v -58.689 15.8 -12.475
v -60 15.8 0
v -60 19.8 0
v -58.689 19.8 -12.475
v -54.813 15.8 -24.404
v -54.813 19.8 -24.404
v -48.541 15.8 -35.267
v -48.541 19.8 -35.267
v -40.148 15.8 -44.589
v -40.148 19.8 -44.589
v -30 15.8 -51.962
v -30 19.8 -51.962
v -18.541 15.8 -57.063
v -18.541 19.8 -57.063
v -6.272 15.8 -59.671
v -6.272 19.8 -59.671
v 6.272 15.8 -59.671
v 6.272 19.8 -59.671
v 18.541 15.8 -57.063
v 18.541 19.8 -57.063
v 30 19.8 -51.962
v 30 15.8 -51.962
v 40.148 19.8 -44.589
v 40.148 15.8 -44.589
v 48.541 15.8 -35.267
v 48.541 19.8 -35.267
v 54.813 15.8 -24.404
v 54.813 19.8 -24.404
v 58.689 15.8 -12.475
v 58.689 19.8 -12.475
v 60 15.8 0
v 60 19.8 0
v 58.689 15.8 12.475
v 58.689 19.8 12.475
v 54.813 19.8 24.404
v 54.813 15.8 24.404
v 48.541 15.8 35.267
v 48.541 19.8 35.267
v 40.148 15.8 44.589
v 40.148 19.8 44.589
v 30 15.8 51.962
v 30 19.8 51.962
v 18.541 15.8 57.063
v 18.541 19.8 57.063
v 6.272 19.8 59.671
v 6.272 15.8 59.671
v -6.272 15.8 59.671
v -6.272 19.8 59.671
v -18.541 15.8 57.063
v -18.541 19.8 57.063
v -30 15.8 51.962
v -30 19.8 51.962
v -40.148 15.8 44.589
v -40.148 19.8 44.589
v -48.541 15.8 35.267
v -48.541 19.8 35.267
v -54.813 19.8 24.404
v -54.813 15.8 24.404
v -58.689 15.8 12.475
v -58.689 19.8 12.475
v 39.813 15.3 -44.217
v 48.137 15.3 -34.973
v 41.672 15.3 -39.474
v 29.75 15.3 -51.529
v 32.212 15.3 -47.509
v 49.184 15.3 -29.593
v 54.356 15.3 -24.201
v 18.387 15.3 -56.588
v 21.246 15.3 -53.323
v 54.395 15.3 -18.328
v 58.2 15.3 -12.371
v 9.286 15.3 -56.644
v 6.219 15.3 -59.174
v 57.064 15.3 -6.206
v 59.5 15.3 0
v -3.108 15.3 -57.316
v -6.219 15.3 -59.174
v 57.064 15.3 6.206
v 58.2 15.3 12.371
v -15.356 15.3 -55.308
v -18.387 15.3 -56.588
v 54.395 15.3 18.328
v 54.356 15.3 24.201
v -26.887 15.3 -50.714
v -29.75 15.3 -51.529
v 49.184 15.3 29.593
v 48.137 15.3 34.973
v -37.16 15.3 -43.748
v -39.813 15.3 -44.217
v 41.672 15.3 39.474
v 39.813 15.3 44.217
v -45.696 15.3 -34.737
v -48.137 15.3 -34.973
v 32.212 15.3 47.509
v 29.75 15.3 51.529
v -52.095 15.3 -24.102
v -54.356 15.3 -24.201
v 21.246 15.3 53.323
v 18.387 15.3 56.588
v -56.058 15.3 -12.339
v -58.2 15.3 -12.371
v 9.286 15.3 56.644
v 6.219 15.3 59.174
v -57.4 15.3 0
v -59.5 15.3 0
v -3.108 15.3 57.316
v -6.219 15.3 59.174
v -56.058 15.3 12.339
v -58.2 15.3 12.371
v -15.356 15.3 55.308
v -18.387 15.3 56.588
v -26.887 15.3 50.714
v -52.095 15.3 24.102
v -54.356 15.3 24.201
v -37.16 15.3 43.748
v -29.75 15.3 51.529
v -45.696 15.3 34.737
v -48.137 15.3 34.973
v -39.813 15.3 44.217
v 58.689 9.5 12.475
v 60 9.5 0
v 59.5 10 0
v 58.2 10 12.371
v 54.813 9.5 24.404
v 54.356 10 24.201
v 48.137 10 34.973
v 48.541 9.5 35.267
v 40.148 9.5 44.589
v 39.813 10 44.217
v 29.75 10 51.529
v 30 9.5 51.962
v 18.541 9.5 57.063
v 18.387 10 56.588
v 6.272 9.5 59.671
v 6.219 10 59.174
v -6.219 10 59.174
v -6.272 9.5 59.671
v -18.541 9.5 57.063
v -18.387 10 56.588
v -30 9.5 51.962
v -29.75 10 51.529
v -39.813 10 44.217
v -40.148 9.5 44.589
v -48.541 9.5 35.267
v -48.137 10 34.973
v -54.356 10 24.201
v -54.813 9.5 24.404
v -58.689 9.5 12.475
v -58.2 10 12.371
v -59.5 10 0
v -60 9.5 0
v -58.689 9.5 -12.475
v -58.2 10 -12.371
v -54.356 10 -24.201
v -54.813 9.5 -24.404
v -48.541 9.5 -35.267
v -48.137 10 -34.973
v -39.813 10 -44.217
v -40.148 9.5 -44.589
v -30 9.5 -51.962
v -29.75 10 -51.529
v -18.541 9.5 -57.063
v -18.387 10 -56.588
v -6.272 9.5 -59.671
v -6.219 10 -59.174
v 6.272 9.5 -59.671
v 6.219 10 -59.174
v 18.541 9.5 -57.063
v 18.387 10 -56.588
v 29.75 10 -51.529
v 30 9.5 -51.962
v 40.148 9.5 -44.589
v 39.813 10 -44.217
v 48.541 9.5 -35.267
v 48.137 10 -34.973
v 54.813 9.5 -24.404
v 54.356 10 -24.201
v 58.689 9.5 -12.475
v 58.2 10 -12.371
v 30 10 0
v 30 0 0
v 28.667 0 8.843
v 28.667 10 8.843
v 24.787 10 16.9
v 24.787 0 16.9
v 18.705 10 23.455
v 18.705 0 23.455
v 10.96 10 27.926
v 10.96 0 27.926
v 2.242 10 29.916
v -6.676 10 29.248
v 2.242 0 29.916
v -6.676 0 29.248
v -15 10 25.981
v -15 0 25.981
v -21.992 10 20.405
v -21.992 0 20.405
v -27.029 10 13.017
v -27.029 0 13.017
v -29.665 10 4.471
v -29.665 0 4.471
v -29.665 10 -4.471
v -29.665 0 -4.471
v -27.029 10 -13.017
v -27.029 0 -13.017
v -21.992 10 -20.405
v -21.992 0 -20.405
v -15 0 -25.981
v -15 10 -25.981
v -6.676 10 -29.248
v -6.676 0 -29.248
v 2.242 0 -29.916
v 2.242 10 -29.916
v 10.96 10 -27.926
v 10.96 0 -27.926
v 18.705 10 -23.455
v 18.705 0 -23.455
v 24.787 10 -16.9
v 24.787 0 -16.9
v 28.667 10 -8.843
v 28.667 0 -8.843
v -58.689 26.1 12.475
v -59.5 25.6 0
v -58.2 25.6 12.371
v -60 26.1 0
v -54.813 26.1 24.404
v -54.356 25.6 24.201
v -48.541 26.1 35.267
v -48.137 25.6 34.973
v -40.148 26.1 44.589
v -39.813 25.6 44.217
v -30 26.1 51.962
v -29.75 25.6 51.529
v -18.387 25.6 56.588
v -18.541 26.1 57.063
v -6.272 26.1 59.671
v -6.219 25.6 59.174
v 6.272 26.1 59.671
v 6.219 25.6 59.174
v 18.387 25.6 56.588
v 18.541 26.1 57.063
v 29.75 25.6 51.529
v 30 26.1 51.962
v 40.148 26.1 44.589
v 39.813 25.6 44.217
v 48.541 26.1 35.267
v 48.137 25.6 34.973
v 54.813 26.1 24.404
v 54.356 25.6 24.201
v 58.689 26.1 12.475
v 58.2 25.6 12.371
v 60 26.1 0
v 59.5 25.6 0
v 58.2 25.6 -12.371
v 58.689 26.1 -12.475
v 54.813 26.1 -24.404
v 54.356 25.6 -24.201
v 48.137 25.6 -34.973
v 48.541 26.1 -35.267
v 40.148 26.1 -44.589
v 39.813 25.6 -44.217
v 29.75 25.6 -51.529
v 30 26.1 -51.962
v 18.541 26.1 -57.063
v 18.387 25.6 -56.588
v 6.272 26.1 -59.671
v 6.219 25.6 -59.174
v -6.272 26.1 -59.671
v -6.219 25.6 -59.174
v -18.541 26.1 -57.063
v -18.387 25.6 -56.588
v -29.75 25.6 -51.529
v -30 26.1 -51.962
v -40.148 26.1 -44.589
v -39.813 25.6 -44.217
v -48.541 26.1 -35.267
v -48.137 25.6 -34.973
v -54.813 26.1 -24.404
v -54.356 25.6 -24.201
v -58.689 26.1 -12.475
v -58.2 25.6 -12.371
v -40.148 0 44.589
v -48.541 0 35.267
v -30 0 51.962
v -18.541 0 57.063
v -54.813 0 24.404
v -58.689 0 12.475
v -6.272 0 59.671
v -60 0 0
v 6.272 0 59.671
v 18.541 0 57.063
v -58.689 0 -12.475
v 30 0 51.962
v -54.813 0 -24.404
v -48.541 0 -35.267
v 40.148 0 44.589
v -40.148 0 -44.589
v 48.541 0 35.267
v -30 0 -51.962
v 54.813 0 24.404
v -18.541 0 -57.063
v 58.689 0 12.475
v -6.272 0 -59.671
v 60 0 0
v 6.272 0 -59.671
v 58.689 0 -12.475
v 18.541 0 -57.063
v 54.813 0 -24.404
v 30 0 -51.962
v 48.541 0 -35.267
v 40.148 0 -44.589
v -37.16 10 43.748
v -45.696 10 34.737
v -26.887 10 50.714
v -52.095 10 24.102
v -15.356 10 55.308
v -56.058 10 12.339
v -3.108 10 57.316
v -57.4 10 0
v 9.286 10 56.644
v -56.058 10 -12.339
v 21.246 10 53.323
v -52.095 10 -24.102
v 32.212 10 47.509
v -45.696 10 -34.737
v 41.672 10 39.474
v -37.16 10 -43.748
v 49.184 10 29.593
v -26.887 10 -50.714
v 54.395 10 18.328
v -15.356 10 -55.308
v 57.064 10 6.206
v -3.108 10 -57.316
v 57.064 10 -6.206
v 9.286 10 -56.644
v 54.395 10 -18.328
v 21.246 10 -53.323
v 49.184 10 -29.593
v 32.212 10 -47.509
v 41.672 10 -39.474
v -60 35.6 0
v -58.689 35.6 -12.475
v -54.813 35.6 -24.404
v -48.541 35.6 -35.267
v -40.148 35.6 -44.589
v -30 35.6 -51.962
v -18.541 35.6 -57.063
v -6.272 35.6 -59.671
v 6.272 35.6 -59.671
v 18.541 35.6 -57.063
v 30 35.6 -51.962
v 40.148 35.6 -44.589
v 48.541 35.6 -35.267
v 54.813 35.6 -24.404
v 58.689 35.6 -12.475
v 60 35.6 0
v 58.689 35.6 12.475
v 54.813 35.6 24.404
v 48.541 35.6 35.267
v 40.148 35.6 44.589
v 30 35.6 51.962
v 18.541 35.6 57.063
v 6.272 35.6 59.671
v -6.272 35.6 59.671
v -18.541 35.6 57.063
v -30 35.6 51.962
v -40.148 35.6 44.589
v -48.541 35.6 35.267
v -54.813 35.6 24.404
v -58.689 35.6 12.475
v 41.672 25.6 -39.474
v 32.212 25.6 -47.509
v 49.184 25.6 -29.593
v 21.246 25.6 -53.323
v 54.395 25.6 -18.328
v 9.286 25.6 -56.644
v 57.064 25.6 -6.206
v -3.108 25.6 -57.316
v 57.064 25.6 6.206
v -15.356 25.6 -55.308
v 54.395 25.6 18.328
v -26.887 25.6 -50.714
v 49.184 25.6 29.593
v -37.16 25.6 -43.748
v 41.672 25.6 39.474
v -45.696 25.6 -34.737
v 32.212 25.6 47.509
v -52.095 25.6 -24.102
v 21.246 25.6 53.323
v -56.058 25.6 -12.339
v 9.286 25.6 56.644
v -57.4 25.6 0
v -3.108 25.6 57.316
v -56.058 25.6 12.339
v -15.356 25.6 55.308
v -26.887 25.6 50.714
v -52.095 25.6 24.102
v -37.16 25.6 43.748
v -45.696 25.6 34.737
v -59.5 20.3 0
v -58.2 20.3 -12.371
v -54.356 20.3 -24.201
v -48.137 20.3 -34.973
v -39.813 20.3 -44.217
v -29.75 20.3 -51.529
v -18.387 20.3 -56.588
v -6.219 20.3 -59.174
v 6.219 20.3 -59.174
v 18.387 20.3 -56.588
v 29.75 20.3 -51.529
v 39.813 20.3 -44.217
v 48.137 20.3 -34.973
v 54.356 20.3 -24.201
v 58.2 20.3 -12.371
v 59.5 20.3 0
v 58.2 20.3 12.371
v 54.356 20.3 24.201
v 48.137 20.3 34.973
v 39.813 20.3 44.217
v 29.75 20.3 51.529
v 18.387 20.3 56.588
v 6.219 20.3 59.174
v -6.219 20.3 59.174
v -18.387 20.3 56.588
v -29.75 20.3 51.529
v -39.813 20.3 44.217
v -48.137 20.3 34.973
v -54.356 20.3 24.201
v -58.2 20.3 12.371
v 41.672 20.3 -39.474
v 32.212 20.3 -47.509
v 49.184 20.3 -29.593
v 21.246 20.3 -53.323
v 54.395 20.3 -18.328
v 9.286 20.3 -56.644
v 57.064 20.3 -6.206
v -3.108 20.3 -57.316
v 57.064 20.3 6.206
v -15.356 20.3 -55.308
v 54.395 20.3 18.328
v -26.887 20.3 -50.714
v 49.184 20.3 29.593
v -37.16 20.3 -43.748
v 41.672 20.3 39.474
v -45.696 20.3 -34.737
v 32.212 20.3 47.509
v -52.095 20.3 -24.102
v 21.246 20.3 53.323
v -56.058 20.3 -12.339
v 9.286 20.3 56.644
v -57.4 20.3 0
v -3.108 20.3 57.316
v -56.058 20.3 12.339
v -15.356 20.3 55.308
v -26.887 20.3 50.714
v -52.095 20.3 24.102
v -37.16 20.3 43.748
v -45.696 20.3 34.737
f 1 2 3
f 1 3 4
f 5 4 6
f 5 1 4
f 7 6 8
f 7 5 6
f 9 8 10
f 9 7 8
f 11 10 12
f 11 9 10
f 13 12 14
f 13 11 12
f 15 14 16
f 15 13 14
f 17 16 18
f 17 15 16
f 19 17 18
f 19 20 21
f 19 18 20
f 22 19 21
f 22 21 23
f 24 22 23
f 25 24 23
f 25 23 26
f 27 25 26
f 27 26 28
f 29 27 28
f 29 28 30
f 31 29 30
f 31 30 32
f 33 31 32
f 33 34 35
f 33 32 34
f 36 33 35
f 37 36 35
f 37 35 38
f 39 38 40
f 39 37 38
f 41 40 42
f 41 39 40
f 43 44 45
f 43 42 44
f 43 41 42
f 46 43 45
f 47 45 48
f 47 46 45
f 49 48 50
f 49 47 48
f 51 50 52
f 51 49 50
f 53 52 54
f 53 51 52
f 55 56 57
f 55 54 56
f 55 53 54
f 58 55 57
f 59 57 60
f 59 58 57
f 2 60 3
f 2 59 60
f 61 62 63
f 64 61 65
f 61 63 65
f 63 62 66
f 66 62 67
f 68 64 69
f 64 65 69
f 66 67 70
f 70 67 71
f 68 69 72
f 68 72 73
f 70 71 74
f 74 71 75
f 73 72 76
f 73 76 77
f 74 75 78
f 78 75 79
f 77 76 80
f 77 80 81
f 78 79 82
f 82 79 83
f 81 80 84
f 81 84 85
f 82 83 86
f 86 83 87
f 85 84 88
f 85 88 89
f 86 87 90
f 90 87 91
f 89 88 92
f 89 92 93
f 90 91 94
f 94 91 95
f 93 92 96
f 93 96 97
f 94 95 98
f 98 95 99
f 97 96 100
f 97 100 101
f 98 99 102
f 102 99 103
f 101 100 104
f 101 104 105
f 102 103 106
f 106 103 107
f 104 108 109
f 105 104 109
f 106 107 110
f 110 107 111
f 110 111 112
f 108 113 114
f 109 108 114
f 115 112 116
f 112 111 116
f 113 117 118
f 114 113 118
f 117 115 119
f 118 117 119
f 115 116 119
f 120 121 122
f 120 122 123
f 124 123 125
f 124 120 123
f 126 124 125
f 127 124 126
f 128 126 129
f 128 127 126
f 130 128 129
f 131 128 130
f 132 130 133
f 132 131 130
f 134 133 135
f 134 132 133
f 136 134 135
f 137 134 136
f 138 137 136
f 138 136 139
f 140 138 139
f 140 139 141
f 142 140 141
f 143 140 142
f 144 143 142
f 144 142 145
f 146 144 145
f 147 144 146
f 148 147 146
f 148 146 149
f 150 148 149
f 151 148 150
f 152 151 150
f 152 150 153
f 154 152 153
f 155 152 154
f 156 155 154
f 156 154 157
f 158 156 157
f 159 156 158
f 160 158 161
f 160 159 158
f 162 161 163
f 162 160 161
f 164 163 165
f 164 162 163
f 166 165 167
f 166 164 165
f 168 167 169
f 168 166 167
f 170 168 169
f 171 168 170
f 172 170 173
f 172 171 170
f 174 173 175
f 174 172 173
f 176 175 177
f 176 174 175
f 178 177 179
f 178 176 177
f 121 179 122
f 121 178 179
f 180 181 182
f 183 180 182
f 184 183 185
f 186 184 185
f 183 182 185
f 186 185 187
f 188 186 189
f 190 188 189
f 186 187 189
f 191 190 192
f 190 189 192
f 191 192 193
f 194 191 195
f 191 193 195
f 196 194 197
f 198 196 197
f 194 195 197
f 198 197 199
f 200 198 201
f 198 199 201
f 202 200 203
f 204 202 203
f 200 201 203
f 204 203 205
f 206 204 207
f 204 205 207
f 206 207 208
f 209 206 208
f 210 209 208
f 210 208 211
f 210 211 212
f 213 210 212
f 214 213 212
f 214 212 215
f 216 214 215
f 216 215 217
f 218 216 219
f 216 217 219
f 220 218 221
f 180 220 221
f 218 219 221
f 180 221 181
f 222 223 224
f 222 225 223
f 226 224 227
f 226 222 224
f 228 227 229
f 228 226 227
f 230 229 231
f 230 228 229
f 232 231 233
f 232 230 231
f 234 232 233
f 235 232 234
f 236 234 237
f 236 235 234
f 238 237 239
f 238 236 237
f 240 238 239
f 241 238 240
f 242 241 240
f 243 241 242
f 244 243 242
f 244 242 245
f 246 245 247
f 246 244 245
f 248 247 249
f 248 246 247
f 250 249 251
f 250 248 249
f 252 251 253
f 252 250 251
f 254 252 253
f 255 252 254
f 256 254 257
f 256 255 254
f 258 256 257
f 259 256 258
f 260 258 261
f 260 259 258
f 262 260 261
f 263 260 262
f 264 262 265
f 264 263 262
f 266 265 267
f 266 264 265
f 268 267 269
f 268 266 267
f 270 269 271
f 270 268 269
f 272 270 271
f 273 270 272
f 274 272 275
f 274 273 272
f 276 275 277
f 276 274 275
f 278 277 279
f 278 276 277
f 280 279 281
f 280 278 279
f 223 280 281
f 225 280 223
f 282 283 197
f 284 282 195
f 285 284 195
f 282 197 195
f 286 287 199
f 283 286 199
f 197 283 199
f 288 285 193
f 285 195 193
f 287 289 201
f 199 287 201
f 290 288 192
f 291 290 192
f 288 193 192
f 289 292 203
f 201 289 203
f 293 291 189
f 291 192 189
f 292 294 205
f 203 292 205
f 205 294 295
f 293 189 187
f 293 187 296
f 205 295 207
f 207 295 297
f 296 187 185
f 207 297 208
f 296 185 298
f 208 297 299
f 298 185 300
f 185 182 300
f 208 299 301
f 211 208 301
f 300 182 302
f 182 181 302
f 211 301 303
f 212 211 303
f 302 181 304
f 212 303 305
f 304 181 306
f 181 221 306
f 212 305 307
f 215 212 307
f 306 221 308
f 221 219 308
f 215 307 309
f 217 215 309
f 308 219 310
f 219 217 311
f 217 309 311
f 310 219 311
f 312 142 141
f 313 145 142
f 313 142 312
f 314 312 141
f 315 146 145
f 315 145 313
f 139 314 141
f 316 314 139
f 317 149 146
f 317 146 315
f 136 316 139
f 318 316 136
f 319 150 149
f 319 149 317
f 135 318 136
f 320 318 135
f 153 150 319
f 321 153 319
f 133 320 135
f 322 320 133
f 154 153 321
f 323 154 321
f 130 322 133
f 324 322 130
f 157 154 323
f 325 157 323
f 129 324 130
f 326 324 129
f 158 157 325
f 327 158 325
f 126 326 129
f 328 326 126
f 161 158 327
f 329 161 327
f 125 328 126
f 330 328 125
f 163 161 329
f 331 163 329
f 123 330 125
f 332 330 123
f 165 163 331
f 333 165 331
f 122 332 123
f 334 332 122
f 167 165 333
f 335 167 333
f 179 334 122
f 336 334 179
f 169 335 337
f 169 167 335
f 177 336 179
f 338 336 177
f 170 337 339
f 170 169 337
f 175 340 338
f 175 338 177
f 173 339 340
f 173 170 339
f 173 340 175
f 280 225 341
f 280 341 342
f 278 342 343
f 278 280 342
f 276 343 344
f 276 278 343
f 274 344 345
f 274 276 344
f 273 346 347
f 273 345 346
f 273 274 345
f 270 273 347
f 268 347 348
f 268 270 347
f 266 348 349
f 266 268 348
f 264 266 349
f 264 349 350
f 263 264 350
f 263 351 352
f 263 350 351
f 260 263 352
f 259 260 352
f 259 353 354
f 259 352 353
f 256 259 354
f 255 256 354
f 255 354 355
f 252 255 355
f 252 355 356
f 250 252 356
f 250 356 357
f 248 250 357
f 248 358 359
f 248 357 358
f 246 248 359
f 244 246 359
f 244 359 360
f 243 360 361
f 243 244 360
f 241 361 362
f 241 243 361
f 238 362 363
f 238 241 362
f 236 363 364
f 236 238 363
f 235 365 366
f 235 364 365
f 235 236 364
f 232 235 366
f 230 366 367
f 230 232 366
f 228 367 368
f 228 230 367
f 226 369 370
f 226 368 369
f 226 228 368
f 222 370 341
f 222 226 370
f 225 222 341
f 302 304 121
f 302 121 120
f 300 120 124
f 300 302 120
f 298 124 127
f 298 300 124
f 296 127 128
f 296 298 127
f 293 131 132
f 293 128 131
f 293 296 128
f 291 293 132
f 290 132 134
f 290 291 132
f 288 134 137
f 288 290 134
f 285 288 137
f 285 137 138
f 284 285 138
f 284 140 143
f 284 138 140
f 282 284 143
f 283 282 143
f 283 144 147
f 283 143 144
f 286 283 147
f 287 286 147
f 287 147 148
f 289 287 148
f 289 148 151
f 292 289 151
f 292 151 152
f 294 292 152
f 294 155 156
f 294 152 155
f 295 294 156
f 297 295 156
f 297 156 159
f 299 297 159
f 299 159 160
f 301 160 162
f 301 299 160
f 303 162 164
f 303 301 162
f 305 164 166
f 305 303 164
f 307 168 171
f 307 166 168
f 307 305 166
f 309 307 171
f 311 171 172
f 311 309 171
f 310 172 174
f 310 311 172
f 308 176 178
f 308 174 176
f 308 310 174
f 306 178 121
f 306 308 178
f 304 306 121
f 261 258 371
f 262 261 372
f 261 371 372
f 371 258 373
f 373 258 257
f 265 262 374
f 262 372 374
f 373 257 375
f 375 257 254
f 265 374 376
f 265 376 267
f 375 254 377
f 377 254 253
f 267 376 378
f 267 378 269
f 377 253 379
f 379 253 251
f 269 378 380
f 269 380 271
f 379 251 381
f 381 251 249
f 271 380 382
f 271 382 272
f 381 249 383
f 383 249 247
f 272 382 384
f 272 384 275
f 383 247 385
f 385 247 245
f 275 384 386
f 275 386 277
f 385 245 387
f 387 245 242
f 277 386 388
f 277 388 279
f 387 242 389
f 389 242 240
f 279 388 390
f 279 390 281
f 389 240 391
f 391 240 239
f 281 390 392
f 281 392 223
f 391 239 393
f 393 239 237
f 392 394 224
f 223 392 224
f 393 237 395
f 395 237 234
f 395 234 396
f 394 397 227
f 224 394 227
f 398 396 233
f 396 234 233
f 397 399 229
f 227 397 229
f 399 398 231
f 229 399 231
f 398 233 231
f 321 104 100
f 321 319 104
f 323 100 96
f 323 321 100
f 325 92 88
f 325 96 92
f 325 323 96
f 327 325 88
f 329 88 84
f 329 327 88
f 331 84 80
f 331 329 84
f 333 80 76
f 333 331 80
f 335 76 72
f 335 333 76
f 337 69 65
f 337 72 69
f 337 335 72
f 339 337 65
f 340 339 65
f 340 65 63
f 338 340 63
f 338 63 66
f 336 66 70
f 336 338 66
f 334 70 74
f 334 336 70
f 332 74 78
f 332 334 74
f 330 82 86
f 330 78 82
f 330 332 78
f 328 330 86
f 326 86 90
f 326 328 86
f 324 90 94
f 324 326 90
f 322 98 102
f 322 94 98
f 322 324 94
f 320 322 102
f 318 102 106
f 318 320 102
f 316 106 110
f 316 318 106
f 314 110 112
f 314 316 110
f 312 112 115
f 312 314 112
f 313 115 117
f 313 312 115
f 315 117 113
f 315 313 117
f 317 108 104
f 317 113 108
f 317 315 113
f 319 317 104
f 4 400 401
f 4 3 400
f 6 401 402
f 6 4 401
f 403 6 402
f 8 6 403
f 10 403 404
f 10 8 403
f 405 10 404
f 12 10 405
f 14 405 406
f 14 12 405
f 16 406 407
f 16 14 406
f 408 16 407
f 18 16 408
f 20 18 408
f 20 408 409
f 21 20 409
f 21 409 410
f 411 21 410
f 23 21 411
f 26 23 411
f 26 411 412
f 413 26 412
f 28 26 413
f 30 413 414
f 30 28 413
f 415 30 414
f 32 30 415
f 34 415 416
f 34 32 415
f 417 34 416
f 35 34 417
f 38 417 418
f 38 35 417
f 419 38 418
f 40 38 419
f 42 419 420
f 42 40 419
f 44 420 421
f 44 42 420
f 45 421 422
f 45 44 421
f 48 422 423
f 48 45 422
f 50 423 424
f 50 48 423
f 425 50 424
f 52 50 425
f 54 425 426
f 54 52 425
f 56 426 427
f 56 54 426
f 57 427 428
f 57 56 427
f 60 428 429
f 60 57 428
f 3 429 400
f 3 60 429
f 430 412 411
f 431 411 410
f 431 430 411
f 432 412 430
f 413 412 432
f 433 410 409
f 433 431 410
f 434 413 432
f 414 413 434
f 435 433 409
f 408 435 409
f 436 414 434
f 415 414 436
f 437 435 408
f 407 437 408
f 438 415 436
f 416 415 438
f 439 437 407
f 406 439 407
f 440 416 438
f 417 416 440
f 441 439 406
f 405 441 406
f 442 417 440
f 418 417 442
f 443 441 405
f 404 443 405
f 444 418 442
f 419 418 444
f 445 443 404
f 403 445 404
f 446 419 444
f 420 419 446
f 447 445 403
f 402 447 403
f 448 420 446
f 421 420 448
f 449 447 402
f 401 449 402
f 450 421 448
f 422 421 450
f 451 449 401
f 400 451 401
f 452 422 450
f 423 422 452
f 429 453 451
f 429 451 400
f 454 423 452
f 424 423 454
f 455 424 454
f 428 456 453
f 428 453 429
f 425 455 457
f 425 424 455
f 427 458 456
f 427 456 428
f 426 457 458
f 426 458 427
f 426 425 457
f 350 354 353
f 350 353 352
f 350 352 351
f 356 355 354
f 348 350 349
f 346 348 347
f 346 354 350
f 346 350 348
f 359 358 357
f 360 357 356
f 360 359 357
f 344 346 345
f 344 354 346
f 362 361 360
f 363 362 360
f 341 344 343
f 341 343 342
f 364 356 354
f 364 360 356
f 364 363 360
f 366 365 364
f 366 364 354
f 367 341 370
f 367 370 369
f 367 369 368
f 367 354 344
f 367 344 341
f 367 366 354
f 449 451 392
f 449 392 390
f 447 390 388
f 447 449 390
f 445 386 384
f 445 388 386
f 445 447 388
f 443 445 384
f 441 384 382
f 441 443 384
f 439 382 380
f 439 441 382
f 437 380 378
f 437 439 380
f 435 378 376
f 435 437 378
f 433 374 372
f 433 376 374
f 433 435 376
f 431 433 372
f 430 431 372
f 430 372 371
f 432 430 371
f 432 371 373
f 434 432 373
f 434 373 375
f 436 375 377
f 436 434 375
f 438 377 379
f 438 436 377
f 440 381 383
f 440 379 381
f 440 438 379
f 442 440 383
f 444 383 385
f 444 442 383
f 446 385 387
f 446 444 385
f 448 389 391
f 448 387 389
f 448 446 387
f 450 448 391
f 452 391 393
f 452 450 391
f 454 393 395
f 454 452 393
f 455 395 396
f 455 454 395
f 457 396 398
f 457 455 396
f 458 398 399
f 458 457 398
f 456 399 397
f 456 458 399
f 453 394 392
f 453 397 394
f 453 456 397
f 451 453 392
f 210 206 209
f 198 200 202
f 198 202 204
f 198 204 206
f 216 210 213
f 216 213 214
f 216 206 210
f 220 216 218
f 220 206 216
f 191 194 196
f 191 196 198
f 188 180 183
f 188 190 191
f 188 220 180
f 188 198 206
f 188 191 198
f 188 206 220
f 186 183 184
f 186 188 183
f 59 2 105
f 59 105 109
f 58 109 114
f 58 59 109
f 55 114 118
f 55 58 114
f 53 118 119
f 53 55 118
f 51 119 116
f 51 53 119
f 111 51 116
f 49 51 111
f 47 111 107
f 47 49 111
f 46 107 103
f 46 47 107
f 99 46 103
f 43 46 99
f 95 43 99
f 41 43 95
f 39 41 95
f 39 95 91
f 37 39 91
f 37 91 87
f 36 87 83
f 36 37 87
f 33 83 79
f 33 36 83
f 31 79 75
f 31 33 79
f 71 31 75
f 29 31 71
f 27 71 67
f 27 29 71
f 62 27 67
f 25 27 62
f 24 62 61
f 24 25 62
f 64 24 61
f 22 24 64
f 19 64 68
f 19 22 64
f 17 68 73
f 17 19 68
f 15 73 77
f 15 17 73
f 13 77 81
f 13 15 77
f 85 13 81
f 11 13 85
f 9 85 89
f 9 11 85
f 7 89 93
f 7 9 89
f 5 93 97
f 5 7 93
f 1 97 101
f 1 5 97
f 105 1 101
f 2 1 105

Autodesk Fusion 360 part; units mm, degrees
sketch "Sketch1" plane through (0, 0, 0) normal (0, 1, 0) x (1, 0, 0)
  circle A0 centre (0, 0) radius 60
  dimension "d1" = 120
extrude "Extrude1" add sketch "Sketch1" along normal blind 10
sketch "Sketch2" plane through (0, 10, 0) normal (0, 1, 0) x (-1, 0, 0)
  circle A0 centre (0, 0) radius 60
  circle A1 centre (0, 0) radius 57.4
  dimension "d4" = 114.8
extrude "Extrude2" add sketch "Sketch2" along normal blind 5.3 contours A1
sketch "Sketch3" plane through (0, 15.3, 0) normal (0, 1, 0) x (-1, 0, 0)
  circle A0 centre (0, 0) radius 57.4
  circle A1 centre (0, 0) radius 60
  dimension "d7" = 120
extrude "Extrude3" add sketch "Sketch3" along normal blind 5 contours A0 | A1
sketch "Sketch4" plane through (0, 20.3, 0) normal (0, 1, 0) x (-1, 0, 0)
  circle A0 centre (0, 0) radius 60
  circle A1 centre (0, 0) radius 57.4
  dimension "d10" = 114.8
extrude "Extrude4" add sketch "Sketch4" along normal blind 5.3 contours A1
sketch "Sketch5" plane through (0, 25.6, 0) normal (0, 1, 0) x (-1, 0, 0)
  circle A0 centre (0, 0) radius 57.4
  circle A1 centre (0, 0) radius 60
  dimension "d13" = 120
extrude "Extrude5" add sketch "Sketch5" along normal blind 10 contours A0 | A1
sketch "Sketch7" plane through (0, 0, 0) normal (0, -1, 0) x (1, 0, 0)
  circle A0 centre (0, 0) radius 60
  circle A1 centre (0, 0) radius 30
  dimension "d22" = 60
extrude "Extrude7" cut sketch "Sketch7" against normal blind 10 contours A1
chamfer "Chamfer1" distance 0.5 angle 45 1 edges at (55.9396, 20.3, -21.6969)
chamfer "Chamfer2" distance 0.5 angle 45 3 edges at (55.9396, 25.6, -21.6969) (55.9396, 15.3, -21.6969) (-55.9396, 10, 21.6969)
